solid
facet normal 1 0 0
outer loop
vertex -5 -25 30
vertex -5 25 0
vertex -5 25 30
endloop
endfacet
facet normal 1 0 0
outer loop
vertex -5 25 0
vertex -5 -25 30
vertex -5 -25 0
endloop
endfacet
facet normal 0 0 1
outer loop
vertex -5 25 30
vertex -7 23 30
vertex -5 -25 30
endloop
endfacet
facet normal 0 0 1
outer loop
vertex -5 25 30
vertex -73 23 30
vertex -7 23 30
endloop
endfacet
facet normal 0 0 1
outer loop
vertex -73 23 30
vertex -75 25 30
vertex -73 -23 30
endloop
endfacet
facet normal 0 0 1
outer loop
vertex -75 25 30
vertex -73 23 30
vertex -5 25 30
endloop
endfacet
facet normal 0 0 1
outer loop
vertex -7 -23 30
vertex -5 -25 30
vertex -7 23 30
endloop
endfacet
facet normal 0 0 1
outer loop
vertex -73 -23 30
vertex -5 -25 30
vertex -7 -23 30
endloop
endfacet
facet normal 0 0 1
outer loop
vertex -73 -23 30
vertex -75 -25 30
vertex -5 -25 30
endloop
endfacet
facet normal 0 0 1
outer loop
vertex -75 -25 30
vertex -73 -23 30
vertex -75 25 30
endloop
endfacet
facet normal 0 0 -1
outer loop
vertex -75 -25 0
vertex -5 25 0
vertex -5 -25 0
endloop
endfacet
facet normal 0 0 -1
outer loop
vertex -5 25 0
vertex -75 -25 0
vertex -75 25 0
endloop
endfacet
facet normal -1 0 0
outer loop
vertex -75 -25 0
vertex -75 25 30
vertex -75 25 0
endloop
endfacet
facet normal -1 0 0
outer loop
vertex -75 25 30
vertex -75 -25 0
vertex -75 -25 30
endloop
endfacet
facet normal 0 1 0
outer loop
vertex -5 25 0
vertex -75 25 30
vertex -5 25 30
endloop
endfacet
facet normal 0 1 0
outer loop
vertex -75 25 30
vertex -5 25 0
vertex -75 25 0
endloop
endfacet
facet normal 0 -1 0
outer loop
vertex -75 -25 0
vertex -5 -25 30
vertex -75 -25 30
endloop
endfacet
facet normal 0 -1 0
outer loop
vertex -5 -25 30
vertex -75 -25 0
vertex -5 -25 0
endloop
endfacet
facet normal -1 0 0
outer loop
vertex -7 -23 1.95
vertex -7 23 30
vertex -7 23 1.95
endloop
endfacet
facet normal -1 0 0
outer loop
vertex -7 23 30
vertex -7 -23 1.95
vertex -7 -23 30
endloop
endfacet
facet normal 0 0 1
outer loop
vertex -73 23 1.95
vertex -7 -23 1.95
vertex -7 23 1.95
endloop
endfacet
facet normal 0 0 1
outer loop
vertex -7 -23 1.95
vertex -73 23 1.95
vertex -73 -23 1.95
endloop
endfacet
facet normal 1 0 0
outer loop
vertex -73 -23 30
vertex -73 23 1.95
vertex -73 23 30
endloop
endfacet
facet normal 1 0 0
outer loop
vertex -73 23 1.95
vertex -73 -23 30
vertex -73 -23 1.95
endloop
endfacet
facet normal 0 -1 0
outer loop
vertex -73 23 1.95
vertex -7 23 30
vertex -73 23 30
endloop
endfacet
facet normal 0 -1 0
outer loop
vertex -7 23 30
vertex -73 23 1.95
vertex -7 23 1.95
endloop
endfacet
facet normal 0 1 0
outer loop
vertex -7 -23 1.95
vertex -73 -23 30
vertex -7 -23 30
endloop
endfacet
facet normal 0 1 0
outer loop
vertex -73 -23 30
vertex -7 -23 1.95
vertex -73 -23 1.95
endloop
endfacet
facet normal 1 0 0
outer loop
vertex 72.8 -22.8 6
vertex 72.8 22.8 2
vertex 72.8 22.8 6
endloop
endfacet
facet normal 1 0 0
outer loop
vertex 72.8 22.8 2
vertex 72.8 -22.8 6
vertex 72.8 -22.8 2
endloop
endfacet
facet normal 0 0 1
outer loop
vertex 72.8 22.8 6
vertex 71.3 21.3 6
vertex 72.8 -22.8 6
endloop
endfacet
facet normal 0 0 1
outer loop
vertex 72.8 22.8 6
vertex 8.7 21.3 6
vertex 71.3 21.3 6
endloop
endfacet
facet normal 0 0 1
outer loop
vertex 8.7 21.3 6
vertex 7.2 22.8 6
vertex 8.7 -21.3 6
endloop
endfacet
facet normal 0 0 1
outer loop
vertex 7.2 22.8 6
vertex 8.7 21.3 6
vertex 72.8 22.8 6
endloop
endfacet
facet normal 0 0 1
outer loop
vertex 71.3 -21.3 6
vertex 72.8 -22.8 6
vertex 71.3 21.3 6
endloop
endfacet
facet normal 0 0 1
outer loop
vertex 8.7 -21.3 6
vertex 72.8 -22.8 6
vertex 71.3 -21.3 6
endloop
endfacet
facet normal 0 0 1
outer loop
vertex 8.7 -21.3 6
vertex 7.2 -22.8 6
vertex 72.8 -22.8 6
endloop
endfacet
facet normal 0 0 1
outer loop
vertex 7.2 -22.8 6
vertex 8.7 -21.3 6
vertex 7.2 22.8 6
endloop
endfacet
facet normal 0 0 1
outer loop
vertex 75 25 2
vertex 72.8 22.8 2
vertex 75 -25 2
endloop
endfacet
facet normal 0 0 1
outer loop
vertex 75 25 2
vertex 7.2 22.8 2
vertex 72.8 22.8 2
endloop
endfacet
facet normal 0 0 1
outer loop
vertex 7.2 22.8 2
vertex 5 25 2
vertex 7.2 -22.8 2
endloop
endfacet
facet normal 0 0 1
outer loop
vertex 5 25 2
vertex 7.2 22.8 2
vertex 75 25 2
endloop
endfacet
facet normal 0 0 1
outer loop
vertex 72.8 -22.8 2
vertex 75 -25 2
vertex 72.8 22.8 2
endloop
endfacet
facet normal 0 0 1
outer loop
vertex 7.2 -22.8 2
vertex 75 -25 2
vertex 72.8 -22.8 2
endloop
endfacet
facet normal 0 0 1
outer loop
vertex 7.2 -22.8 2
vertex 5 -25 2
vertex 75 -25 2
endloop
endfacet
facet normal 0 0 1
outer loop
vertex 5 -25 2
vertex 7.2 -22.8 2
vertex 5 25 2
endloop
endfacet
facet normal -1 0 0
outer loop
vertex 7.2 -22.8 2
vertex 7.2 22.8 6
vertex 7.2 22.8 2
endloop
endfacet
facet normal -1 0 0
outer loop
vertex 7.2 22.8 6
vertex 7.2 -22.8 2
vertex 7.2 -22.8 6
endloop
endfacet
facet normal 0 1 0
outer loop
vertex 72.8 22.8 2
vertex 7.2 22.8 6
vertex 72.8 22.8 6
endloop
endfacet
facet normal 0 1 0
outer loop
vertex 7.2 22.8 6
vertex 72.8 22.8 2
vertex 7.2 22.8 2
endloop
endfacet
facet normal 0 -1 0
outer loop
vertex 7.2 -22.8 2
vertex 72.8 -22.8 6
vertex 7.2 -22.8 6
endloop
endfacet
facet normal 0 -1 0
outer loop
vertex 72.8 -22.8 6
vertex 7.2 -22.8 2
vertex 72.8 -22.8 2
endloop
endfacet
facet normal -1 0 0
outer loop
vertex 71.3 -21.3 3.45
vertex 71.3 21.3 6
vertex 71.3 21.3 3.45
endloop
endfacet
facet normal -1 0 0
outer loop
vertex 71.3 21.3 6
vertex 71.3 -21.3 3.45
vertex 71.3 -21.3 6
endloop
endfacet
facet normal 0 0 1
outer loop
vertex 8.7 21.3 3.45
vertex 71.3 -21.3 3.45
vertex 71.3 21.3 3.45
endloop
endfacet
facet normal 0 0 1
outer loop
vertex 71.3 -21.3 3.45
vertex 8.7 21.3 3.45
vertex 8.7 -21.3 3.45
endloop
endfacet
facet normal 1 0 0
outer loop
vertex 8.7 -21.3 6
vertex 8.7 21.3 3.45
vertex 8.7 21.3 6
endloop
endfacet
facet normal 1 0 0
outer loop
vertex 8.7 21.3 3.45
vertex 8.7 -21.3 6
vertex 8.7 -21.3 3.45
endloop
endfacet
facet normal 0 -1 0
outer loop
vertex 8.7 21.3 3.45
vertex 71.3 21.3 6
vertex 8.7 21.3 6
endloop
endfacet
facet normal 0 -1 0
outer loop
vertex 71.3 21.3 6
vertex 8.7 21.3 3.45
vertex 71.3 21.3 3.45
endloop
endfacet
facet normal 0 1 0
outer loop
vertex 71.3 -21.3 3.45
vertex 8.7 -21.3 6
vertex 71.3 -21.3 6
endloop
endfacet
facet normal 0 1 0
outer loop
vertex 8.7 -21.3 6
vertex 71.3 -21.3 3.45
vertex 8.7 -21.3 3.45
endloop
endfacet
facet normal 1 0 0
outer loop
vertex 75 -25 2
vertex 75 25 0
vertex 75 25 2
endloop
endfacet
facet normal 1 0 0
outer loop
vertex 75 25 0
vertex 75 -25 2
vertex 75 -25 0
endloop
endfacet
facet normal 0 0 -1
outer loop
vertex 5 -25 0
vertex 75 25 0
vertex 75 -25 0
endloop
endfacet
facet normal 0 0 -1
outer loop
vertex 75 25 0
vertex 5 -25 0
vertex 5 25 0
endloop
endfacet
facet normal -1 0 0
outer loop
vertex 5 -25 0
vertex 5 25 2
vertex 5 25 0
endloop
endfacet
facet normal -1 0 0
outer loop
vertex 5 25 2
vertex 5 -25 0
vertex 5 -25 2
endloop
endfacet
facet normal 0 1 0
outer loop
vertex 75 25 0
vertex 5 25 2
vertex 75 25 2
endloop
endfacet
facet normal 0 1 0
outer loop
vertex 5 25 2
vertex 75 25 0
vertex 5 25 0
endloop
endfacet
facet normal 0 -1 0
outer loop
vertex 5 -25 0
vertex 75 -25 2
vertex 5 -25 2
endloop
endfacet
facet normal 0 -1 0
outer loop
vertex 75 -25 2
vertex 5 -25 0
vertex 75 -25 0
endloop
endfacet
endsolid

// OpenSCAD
// Enclosure dimensions
box_x = 70;           // Box outer X dimension
box_y = 50;           // Box outer Y dimension
box_z = 30;           // Box outer Z dimension
box_wall = 2;         // Wall thickness
box_floor = 2;        // Floor thickness

lid_x = 70;           // Lid plate X dimension
lid_y = 50;           // Lid plate Y dimension
lid_thick = 2;        // Lid plate thickness
lip_outer_x = 65.6;   // Lip outer X dimension
lip_outer_y = 45.6;   // Lip outer Y dimension
lip_thick_wall = 1.5; // Lip wall thickness
lip_height = 4;       // Lip height

gap = 10;             // Gap between box and lid

// Derived dimensions
box_inner_x = box_x - 2 * box_wall;
box_inner_y = box_y - 2 * box_wall;
box_inner_z = box_z - box_floor;

lip_inner_x = lip_outer_x - 2 * lip_thick_wall;
lip_inner_y = lip_outer_y - 2 * lip_thick_wall;
lip_cavity_z = lip_height - lip_thick_wall;

// Positions (centered with 10 mm gap)
box_pos_x = -(box_x / 2 + gap / 2);
lid_pos_x = (lid_x / 2 + gap / 2);

$fn = 64;

// Part 1: Box - outer shell with open top and solid floor
translate([box_pos_x, 0, box_z / 2]) {
  difference() {
    // Outer shell
    cube([box_x, box_y, box_z], center = true);
    // Inner cavity (leave floor and walls)
    translate([0, 0, box_floor / 2]) {
      cube([box_inner_x, box_inner_y, box_inner_z + 0.1], center = true);
    }
  }
}

// Part 2: Lid - base plate
translate([lid_pos_x, 0, lid_thick / 2]) {
  cube([lid_x, lid_y, lid_thick], center = true);
}

// Part 2: Lid - lip walls (hollow on inside)
translate([lid_pos_x, 0, lid_thick + lip_height / 2]) {
  difference() {
    // Outer shell
    cube([lip_outer_x, lip_outer_y, lip_height], center = true);
    // Inner cavity with 1.5mm bottom
    translate([0, 0, lip_thick_wall / 2]) {
      cube([lip_inner_x, lip_inner_y, lip_cavity_z + 0.1], center = true);
    }
  }
}
